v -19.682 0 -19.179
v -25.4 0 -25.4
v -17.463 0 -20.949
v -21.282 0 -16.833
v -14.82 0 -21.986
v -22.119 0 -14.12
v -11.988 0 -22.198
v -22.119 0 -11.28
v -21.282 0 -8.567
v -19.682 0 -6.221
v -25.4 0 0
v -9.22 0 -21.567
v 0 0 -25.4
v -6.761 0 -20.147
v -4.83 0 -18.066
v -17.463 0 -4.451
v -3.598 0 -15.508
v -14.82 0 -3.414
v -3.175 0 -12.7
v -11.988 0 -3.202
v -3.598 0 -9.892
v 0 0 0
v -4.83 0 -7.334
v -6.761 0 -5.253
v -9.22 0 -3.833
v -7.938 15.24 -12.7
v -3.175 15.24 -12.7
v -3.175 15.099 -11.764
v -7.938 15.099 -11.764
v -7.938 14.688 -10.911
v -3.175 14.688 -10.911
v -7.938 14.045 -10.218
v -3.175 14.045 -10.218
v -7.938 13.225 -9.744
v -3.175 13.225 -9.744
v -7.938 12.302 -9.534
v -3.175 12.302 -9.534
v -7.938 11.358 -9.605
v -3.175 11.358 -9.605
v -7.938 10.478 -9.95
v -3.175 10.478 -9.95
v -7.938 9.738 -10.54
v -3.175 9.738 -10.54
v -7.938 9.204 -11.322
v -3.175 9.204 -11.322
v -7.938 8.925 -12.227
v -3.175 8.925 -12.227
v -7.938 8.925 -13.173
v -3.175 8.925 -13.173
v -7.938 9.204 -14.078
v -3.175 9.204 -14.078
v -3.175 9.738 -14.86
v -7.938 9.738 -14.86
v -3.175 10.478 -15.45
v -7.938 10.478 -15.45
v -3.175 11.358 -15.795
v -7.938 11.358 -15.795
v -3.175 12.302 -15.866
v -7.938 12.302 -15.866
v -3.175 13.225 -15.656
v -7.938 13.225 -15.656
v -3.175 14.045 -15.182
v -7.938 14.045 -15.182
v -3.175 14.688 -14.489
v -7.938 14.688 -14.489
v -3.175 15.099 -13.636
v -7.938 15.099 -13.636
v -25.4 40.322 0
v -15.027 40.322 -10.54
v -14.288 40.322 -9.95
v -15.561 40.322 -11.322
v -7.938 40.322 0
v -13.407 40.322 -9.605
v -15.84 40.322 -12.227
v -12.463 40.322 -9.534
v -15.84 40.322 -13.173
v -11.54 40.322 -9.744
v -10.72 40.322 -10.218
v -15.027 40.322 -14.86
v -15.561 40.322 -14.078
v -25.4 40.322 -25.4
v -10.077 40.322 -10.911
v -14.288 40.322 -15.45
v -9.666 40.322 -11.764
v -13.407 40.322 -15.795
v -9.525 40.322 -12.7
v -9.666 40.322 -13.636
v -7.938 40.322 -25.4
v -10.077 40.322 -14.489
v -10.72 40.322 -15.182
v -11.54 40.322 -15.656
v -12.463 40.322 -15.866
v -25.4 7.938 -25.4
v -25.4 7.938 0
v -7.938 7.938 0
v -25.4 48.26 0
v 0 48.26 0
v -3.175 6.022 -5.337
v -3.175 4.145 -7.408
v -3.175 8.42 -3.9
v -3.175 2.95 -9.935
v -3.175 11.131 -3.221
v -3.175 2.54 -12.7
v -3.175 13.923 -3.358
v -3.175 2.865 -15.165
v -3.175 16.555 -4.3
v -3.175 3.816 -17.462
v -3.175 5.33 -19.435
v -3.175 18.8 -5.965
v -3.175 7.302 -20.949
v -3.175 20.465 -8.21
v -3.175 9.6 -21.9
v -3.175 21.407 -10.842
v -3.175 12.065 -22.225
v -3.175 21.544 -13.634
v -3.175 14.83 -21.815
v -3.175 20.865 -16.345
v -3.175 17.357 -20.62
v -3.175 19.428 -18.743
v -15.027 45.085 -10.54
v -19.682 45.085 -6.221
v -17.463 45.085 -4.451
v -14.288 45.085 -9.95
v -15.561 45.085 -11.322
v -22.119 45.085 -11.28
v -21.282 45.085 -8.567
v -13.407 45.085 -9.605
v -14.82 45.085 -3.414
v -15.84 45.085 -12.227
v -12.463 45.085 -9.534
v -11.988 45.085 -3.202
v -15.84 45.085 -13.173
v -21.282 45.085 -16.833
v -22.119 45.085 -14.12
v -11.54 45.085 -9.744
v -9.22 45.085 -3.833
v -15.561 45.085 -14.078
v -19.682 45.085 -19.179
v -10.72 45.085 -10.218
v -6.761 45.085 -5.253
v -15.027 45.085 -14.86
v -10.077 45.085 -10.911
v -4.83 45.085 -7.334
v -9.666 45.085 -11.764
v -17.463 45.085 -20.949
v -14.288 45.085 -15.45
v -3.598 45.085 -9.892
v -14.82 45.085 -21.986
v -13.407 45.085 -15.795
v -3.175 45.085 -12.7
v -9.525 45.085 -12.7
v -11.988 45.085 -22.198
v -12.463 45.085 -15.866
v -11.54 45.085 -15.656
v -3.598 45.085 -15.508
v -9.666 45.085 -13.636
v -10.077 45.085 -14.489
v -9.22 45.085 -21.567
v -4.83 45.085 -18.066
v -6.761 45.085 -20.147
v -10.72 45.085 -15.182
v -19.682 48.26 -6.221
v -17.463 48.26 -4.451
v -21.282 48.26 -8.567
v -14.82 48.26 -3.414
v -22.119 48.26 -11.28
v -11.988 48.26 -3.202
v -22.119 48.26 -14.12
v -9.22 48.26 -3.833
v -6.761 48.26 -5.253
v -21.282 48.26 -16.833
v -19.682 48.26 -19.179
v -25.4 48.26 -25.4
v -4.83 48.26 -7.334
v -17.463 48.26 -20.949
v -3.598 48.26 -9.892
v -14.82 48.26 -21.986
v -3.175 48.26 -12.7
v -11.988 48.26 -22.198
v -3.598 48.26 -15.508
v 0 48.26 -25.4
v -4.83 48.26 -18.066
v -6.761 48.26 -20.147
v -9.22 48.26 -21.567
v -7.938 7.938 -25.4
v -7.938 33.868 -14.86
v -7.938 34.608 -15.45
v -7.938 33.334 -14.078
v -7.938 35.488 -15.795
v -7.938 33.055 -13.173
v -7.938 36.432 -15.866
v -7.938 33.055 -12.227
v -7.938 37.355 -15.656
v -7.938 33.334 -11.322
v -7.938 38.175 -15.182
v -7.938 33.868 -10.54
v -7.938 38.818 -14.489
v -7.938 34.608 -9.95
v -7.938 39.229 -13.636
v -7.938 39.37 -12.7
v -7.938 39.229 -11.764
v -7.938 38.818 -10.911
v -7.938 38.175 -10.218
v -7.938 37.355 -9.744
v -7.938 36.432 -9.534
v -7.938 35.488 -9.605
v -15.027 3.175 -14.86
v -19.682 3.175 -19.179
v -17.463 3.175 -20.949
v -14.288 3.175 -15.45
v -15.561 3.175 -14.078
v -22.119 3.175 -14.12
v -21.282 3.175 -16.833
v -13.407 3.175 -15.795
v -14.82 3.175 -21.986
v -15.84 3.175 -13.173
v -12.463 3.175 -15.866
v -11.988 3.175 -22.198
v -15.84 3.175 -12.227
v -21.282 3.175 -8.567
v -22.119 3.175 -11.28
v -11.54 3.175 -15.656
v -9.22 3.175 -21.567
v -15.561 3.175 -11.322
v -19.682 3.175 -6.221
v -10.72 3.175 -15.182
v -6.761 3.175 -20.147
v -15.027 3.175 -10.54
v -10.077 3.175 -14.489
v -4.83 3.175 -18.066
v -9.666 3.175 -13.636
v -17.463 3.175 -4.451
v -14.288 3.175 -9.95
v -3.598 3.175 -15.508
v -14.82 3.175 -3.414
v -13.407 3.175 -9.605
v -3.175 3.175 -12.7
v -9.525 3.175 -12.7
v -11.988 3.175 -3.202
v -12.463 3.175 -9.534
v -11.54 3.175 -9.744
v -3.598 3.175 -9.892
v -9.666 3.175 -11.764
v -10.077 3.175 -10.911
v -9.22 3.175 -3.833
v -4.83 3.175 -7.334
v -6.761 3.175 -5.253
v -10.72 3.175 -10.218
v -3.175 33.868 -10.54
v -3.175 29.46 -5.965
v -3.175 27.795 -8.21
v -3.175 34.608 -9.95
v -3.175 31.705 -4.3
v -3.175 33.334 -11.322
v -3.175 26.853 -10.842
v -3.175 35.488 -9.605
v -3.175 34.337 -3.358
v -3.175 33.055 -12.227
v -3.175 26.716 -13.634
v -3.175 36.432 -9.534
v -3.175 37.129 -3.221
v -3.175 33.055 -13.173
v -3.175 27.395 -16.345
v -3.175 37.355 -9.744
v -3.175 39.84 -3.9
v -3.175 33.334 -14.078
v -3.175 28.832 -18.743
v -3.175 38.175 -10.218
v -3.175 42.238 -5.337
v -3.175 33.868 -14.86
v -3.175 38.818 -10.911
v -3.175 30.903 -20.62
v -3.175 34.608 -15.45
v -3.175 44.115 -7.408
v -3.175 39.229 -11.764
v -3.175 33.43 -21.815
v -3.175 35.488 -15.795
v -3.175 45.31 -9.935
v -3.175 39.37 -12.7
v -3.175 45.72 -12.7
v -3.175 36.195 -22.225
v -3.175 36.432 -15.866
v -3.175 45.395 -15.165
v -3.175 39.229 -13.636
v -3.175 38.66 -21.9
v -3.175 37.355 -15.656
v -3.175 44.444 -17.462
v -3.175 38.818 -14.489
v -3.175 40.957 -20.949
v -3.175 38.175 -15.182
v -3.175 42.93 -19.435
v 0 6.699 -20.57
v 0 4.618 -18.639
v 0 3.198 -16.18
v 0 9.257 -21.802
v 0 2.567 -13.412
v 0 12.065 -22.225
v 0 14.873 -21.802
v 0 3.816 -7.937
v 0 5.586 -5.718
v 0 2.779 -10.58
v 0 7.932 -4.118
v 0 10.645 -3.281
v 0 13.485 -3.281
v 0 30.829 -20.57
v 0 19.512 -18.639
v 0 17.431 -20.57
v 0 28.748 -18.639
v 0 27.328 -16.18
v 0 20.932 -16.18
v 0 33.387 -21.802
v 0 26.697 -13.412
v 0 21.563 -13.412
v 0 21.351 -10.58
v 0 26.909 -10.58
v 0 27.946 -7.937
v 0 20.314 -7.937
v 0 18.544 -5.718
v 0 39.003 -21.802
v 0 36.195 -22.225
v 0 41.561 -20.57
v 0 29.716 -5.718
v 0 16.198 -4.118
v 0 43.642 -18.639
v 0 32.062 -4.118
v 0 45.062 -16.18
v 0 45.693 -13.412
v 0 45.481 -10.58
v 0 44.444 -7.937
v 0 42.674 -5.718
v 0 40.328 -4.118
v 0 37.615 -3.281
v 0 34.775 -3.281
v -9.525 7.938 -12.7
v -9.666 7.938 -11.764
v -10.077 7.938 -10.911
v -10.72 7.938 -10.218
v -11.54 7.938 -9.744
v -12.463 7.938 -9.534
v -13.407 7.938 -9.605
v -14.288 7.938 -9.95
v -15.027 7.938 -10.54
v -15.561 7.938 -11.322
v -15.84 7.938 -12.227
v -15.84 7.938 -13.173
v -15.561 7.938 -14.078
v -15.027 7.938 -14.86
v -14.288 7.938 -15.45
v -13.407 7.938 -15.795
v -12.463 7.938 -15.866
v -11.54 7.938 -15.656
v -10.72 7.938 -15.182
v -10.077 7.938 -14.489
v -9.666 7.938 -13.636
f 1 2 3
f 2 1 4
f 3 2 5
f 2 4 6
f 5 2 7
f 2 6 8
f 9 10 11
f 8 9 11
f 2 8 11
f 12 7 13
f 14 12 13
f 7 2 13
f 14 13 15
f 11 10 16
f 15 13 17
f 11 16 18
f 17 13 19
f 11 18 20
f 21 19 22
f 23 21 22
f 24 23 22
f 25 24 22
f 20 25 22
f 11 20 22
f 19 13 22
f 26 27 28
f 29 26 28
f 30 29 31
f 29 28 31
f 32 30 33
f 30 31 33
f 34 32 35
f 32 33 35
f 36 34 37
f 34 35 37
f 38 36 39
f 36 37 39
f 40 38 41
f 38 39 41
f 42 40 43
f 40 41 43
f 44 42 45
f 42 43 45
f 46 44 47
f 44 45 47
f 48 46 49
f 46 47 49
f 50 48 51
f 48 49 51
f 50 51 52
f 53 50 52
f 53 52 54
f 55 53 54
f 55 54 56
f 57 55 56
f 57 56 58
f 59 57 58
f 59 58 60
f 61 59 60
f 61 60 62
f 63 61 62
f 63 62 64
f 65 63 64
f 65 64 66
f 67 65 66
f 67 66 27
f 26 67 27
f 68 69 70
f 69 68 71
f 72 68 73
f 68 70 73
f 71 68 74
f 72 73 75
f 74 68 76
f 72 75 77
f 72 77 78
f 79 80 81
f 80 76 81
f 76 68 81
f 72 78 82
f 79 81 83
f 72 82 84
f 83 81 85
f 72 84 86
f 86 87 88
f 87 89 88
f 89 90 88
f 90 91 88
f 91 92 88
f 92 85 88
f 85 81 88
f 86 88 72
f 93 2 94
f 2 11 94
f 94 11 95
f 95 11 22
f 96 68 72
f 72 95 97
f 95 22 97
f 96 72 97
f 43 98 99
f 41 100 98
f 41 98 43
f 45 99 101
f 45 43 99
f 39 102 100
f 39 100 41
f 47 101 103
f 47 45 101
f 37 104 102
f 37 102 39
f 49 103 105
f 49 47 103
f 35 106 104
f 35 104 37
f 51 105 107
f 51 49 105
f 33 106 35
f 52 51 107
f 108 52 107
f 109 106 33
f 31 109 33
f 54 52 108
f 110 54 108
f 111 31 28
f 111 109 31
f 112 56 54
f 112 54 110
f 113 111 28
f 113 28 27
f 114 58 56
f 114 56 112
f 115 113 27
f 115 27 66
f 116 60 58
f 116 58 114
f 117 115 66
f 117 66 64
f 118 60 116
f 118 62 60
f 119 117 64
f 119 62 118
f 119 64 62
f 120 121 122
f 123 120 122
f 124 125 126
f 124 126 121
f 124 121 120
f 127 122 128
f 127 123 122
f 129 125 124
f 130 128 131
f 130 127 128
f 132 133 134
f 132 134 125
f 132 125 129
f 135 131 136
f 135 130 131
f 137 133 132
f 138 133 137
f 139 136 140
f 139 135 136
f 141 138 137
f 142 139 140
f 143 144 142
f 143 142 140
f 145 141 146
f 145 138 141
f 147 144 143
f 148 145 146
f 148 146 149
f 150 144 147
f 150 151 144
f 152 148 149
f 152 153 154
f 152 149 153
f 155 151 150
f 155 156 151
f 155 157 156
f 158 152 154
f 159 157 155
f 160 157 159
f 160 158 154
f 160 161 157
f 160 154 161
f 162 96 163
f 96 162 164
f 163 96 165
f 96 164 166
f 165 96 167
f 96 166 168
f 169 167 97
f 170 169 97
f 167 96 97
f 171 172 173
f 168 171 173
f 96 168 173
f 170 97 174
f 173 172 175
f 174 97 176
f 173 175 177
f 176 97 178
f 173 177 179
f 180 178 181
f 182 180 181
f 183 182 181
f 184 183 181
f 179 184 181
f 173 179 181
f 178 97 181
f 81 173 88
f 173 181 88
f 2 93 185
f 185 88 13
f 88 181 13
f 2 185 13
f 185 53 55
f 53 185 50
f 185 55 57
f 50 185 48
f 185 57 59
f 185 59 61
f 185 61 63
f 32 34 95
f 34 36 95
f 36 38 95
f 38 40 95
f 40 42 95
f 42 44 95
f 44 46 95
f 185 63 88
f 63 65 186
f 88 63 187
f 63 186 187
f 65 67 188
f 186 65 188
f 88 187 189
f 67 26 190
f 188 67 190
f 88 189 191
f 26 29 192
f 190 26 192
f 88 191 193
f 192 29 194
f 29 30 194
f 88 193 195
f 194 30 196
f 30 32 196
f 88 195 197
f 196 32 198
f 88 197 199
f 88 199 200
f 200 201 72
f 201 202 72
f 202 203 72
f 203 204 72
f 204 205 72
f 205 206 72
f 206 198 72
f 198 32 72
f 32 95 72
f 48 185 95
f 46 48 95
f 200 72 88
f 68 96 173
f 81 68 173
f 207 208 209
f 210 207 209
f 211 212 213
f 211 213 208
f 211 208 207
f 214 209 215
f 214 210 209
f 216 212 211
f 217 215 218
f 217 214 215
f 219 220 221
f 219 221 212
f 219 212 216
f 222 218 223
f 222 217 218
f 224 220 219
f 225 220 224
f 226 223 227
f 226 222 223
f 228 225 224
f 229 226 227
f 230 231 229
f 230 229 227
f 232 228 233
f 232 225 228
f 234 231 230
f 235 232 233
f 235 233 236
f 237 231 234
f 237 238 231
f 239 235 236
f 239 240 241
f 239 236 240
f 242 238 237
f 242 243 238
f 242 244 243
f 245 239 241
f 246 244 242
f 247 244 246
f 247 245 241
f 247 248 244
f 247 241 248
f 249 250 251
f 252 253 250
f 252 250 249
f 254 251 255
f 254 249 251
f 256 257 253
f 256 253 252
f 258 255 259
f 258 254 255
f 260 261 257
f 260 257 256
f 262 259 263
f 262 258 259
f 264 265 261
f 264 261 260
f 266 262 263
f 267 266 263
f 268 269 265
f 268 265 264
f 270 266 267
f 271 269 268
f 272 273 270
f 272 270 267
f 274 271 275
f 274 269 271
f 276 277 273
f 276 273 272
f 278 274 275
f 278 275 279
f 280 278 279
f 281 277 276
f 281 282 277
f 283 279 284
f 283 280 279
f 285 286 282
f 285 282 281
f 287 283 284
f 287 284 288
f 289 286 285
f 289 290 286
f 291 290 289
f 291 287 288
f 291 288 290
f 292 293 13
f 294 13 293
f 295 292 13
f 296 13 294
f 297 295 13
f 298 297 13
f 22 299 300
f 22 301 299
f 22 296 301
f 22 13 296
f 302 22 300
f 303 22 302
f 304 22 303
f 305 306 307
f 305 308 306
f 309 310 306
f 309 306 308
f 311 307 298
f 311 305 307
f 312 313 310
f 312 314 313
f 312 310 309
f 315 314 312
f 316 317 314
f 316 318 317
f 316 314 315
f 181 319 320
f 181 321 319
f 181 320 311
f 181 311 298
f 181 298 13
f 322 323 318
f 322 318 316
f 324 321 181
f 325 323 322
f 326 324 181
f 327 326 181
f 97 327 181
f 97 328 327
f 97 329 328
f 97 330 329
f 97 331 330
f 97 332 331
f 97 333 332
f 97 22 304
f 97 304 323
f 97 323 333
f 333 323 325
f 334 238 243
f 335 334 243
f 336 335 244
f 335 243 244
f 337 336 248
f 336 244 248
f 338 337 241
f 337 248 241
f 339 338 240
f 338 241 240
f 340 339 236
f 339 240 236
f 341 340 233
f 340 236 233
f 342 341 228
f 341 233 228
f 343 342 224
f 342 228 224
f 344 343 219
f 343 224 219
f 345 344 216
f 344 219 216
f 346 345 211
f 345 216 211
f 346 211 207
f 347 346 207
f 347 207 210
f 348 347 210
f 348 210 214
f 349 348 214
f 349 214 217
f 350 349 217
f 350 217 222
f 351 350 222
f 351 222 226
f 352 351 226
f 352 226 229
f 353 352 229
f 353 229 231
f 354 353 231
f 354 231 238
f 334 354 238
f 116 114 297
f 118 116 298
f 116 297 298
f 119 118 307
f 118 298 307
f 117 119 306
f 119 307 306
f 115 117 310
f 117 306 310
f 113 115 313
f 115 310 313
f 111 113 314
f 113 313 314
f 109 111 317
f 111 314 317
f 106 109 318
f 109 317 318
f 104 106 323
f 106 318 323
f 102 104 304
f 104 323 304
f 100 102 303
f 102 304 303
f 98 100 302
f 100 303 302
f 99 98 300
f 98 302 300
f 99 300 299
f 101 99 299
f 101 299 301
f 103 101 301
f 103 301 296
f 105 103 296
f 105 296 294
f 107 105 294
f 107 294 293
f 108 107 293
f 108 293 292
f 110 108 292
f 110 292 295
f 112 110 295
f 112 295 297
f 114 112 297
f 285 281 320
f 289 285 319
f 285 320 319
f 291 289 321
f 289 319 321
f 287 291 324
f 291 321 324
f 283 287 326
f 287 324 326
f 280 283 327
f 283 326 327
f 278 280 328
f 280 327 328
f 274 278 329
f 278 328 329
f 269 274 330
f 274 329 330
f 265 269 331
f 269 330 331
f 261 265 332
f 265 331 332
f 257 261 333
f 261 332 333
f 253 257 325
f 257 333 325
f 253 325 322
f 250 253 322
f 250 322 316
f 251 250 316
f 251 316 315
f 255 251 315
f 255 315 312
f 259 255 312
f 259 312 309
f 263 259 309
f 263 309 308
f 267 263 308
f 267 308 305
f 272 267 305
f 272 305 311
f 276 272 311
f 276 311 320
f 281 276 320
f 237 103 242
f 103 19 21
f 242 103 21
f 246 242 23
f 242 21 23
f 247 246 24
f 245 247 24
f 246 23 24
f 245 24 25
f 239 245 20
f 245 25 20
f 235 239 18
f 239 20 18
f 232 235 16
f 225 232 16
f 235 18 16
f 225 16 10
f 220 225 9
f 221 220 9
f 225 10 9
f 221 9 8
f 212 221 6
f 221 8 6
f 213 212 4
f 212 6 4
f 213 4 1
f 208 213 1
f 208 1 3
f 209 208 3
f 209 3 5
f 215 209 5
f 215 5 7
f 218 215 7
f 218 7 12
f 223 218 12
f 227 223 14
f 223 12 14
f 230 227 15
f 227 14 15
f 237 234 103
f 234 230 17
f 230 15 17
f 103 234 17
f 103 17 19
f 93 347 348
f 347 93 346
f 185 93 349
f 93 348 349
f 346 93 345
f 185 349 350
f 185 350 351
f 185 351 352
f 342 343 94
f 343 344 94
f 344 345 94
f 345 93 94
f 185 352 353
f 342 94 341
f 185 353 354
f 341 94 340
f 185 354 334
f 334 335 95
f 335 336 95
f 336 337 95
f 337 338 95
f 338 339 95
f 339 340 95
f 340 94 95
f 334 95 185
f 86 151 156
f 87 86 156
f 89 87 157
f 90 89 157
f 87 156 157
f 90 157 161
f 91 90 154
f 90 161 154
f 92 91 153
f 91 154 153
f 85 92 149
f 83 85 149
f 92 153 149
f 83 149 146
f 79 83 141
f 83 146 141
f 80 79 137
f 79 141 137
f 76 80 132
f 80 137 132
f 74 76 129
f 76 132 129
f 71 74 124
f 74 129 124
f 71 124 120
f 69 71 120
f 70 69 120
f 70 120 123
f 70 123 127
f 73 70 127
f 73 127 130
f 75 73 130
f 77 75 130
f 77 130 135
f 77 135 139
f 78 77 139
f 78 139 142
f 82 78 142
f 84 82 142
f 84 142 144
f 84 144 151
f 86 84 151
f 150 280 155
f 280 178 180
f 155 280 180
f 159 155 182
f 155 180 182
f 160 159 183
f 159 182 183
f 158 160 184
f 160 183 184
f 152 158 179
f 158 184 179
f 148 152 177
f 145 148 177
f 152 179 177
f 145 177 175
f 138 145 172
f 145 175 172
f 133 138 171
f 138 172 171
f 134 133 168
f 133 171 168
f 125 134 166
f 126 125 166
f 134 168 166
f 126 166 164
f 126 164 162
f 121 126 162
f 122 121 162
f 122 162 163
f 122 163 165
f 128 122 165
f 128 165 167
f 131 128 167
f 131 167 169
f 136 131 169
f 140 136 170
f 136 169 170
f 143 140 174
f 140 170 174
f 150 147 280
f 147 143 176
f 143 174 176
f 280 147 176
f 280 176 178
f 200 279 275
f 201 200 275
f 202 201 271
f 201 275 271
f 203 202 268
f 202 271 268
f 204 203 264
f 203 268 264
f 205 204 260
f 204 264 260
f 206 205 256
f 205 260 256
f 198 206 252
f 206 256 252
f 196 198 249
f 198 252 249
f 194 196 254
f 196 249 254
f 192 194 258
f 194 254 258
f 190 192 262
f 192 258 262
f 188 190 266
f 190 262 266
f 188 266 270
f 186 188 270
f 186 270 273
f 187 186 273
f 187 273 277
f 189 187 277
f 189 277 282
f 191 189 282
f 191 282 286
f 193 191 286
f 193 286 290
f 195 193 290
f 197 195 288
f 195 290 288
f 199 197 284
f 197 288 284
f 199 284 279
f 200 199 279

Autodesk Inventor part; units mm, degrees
ref_plane "YZ Plane" through (0, 0, 0) normal (1, 0, 0) x (0, 1, 0)
ref_plane "XZ Plane" through (0, 0, 0) normal (0, 1, 0) x (-1, 0, 0)
ref_plane "XY Plane" through (0, 0, 0) normal (0, 0, 1) x (1, 0, 0)
sketch "Sketch1" plane through (0, 0, 0) normal (1, 0, 0) x (0, 1, 0)
  line L0 (0, 0) -> (48.26, 0)
  line L1 (48.26, 0) -> (48.26, -25.4)
  line L2 (48.26, -25.4) -> (0, -25.4)
  line L3 (0, -25.4) -> (0, 0)
  line L4 (0, 0) -> (24.13, 0) construction
  line L5 (24.13, 0) -> (24.13, -25.4) construction
  line L6 (24.13, -25.4) -> (0, -25.4) construction
  line L7 (0, -25.4) -> (0, 0) construction
  line L8 (24.13, 0) -> (0, -25.4) construction
  line L9 (0, 0) -> (24.13, -25.4) construction
  line L10 (24.13, 0) -> (48.26, -25.4) construction
  line L11 (48.26, 0) -> (24.13, -25.4) construction
  circle A0 centre (12.065, -12.7) radius 3.175
  circle A1 centre (36.195, -12.7) radius 3.175
  dimension "d0" = 48.26
  dimension "d1" = 25.4
  dimension "d2" = 24.13
  dimension "d3" = 25.4
  dimension "d32" = 6.35
  dimension "d33" = 6.35
extrude "Extrusion1" add sketch "Sketch1" against normal blind 7.9375
sketch "Sketch2" plane through (0, 48.26, 0) normal (0, 1, 0) x (1, 0, 0)
  line L0 (0, 0) -> (-25.4, 0)
  line L1 (-25.4, 0) -> (-25.4, 25.4)
  line L2 (-25.4, 25.4) -> (0, 25.4)
  line L3 (0, 25.4) -> (0, 0)
  line L4 (0, 0) -> (-7.9375, 0) construction
  line L5 (-25.4, 25.4) -> (0, 0) construction
  line L6 (0, 0) -> (0, 25.4) construction
  line L7 (0, 25.4) -> (-25.4, 0) construction
  circle A0 centre (-12.7, 12.7) radius 3.175
  dimension "d8" = 25.4
  dimension "d9" = 25.4
  dimension "d34" = 6.35
extrude "Extrusion2" add sketch "Sketch2" against normal blind 7.9375
sketch "Sketch5" plane through (-7.9375, 0, 0) normal (0, 0, 1) x (1, 0, 0)
  line L0 (7.9375, 0) -> (7.9375, 48.26) projected
  line L1 (7.9375, 0) -> (-17.4625, 0)
  line L2 (-17.4625, 0) -> (-17.4625, 7.9375)
  line L3 (-17.4625, 7.9375) -> (7.9375, 7.9375)
  line L4 (7.9375, 7.9375) -> (7.9375, 0)
  dimension "d19" = 25.4
  dimension "d20" = 7.9375
extrude "Extrusion3" add sketch "Sketch5" against normal blind 25.4
sketch "Sketch6" plane through (0, 0, -25.4) normal (0, -1, 0) x (1, 0, 0)
  line L0 (-7.9375, 25.4) -> (-25.4, 25.4) construction
  line L1 (0, 0) -> (-25.4, 0) construction
  line L2 (-25.4, 25.4) -> (0, 0) construction
  line L3 (0, 0) -> (0, 25.4) construction
  line L4 (-25.4, 0) -> (0, 25.4) construction
  circle A0 centre (-12.7, 12.7) radius 3.175
  dimension "d35" = 6.35
sketch "Sketch7" plane through (0, 0, 0) normal (1, 0, 0) x (0, 0, -1)
  line L0 (0, 0) -> (25.4, 0) construction
  line L1 (25.4, 0) -> (25.4, 24.13) construction
  line L2 (25.4, 24.13) -> (0, 24.13) construction
  line L3 (0, 24.13) -> (0, 0) construction
  line L4 (0, 0) -> (25.4, 24.13) construction
  line L5 (0, 24.13) -> (25.4, 0) construction
  line L6 (0, 24.13) -> (25.4, 48.26) construction
  line L7 (25.4, 48.26) -> (0, 48.26) construction
  line L8 (25.4, 24.13) -> (0, 48.26) construction
  circle A0 centre (12.7, 12.065) radius 9.525
  circle A1 centre (12.7, 36.195) radius 9.525
  dimension "d26" = 25.4
  dimension "d27" = 24.13
  dimension "d28" = 19.05
  dimension "d29" = 19.05
extrude "Extrusion5" cut sketch "Sketch7" against normal blind 3.175
extrude "Extrusion6" cut sketch "Sketch6" against normal blind 7.9375
sketch "Sketch8" plane through (0, 0, -25.4) normal (0, -1, 0) x (1, 0, 0)
  line L0 (-7.9375, 25.4) -> (-25.4, 25.4) construction
  line L1 (0, 0) -> (-25.4, 0) construction
  line L2 (-25.4, 25.4) -> (0, 0) construction
  line L3 (0, 0) -> (0, 25.4) construction
  line L4 (-25.4, 25.4) -> (-25.4, 0) construction
  line L5 (0, 25.4) -> (-25.4, 0) construction
  circle A0 centre (-12.7, 12.7) radius 9.525
  dimension "d38" = 19.05
extrude "Extrusion7" cut sketch "Sketch8" against normal blind 3.175
sketch "Sketch9" plane through (0, 48.26, 0) normal (0, 1, 0) x (1, 0, 0)
  line L0 (-25.4, 25.4) -> (-7.9375, 25.4) construction
  line L1 (0, 0) -> (-25.4, 25.4) construction
  line L2 (-7.9375, 0) -> (-25.4, 0) construction
  line L3 (0, 25.4) -> (-25.4, 25.4) construction
  line L4 (-25.4, 0) -> (0, 25.4) construction
  circle A0 centre (-12.7, 12.7) radius 9.525
  dimension "d41" = 19.05
extrude "Extrusion8" cut sketch "Sketch9" against normal blind 3.175
properties part number "MountingBracket_Double"
